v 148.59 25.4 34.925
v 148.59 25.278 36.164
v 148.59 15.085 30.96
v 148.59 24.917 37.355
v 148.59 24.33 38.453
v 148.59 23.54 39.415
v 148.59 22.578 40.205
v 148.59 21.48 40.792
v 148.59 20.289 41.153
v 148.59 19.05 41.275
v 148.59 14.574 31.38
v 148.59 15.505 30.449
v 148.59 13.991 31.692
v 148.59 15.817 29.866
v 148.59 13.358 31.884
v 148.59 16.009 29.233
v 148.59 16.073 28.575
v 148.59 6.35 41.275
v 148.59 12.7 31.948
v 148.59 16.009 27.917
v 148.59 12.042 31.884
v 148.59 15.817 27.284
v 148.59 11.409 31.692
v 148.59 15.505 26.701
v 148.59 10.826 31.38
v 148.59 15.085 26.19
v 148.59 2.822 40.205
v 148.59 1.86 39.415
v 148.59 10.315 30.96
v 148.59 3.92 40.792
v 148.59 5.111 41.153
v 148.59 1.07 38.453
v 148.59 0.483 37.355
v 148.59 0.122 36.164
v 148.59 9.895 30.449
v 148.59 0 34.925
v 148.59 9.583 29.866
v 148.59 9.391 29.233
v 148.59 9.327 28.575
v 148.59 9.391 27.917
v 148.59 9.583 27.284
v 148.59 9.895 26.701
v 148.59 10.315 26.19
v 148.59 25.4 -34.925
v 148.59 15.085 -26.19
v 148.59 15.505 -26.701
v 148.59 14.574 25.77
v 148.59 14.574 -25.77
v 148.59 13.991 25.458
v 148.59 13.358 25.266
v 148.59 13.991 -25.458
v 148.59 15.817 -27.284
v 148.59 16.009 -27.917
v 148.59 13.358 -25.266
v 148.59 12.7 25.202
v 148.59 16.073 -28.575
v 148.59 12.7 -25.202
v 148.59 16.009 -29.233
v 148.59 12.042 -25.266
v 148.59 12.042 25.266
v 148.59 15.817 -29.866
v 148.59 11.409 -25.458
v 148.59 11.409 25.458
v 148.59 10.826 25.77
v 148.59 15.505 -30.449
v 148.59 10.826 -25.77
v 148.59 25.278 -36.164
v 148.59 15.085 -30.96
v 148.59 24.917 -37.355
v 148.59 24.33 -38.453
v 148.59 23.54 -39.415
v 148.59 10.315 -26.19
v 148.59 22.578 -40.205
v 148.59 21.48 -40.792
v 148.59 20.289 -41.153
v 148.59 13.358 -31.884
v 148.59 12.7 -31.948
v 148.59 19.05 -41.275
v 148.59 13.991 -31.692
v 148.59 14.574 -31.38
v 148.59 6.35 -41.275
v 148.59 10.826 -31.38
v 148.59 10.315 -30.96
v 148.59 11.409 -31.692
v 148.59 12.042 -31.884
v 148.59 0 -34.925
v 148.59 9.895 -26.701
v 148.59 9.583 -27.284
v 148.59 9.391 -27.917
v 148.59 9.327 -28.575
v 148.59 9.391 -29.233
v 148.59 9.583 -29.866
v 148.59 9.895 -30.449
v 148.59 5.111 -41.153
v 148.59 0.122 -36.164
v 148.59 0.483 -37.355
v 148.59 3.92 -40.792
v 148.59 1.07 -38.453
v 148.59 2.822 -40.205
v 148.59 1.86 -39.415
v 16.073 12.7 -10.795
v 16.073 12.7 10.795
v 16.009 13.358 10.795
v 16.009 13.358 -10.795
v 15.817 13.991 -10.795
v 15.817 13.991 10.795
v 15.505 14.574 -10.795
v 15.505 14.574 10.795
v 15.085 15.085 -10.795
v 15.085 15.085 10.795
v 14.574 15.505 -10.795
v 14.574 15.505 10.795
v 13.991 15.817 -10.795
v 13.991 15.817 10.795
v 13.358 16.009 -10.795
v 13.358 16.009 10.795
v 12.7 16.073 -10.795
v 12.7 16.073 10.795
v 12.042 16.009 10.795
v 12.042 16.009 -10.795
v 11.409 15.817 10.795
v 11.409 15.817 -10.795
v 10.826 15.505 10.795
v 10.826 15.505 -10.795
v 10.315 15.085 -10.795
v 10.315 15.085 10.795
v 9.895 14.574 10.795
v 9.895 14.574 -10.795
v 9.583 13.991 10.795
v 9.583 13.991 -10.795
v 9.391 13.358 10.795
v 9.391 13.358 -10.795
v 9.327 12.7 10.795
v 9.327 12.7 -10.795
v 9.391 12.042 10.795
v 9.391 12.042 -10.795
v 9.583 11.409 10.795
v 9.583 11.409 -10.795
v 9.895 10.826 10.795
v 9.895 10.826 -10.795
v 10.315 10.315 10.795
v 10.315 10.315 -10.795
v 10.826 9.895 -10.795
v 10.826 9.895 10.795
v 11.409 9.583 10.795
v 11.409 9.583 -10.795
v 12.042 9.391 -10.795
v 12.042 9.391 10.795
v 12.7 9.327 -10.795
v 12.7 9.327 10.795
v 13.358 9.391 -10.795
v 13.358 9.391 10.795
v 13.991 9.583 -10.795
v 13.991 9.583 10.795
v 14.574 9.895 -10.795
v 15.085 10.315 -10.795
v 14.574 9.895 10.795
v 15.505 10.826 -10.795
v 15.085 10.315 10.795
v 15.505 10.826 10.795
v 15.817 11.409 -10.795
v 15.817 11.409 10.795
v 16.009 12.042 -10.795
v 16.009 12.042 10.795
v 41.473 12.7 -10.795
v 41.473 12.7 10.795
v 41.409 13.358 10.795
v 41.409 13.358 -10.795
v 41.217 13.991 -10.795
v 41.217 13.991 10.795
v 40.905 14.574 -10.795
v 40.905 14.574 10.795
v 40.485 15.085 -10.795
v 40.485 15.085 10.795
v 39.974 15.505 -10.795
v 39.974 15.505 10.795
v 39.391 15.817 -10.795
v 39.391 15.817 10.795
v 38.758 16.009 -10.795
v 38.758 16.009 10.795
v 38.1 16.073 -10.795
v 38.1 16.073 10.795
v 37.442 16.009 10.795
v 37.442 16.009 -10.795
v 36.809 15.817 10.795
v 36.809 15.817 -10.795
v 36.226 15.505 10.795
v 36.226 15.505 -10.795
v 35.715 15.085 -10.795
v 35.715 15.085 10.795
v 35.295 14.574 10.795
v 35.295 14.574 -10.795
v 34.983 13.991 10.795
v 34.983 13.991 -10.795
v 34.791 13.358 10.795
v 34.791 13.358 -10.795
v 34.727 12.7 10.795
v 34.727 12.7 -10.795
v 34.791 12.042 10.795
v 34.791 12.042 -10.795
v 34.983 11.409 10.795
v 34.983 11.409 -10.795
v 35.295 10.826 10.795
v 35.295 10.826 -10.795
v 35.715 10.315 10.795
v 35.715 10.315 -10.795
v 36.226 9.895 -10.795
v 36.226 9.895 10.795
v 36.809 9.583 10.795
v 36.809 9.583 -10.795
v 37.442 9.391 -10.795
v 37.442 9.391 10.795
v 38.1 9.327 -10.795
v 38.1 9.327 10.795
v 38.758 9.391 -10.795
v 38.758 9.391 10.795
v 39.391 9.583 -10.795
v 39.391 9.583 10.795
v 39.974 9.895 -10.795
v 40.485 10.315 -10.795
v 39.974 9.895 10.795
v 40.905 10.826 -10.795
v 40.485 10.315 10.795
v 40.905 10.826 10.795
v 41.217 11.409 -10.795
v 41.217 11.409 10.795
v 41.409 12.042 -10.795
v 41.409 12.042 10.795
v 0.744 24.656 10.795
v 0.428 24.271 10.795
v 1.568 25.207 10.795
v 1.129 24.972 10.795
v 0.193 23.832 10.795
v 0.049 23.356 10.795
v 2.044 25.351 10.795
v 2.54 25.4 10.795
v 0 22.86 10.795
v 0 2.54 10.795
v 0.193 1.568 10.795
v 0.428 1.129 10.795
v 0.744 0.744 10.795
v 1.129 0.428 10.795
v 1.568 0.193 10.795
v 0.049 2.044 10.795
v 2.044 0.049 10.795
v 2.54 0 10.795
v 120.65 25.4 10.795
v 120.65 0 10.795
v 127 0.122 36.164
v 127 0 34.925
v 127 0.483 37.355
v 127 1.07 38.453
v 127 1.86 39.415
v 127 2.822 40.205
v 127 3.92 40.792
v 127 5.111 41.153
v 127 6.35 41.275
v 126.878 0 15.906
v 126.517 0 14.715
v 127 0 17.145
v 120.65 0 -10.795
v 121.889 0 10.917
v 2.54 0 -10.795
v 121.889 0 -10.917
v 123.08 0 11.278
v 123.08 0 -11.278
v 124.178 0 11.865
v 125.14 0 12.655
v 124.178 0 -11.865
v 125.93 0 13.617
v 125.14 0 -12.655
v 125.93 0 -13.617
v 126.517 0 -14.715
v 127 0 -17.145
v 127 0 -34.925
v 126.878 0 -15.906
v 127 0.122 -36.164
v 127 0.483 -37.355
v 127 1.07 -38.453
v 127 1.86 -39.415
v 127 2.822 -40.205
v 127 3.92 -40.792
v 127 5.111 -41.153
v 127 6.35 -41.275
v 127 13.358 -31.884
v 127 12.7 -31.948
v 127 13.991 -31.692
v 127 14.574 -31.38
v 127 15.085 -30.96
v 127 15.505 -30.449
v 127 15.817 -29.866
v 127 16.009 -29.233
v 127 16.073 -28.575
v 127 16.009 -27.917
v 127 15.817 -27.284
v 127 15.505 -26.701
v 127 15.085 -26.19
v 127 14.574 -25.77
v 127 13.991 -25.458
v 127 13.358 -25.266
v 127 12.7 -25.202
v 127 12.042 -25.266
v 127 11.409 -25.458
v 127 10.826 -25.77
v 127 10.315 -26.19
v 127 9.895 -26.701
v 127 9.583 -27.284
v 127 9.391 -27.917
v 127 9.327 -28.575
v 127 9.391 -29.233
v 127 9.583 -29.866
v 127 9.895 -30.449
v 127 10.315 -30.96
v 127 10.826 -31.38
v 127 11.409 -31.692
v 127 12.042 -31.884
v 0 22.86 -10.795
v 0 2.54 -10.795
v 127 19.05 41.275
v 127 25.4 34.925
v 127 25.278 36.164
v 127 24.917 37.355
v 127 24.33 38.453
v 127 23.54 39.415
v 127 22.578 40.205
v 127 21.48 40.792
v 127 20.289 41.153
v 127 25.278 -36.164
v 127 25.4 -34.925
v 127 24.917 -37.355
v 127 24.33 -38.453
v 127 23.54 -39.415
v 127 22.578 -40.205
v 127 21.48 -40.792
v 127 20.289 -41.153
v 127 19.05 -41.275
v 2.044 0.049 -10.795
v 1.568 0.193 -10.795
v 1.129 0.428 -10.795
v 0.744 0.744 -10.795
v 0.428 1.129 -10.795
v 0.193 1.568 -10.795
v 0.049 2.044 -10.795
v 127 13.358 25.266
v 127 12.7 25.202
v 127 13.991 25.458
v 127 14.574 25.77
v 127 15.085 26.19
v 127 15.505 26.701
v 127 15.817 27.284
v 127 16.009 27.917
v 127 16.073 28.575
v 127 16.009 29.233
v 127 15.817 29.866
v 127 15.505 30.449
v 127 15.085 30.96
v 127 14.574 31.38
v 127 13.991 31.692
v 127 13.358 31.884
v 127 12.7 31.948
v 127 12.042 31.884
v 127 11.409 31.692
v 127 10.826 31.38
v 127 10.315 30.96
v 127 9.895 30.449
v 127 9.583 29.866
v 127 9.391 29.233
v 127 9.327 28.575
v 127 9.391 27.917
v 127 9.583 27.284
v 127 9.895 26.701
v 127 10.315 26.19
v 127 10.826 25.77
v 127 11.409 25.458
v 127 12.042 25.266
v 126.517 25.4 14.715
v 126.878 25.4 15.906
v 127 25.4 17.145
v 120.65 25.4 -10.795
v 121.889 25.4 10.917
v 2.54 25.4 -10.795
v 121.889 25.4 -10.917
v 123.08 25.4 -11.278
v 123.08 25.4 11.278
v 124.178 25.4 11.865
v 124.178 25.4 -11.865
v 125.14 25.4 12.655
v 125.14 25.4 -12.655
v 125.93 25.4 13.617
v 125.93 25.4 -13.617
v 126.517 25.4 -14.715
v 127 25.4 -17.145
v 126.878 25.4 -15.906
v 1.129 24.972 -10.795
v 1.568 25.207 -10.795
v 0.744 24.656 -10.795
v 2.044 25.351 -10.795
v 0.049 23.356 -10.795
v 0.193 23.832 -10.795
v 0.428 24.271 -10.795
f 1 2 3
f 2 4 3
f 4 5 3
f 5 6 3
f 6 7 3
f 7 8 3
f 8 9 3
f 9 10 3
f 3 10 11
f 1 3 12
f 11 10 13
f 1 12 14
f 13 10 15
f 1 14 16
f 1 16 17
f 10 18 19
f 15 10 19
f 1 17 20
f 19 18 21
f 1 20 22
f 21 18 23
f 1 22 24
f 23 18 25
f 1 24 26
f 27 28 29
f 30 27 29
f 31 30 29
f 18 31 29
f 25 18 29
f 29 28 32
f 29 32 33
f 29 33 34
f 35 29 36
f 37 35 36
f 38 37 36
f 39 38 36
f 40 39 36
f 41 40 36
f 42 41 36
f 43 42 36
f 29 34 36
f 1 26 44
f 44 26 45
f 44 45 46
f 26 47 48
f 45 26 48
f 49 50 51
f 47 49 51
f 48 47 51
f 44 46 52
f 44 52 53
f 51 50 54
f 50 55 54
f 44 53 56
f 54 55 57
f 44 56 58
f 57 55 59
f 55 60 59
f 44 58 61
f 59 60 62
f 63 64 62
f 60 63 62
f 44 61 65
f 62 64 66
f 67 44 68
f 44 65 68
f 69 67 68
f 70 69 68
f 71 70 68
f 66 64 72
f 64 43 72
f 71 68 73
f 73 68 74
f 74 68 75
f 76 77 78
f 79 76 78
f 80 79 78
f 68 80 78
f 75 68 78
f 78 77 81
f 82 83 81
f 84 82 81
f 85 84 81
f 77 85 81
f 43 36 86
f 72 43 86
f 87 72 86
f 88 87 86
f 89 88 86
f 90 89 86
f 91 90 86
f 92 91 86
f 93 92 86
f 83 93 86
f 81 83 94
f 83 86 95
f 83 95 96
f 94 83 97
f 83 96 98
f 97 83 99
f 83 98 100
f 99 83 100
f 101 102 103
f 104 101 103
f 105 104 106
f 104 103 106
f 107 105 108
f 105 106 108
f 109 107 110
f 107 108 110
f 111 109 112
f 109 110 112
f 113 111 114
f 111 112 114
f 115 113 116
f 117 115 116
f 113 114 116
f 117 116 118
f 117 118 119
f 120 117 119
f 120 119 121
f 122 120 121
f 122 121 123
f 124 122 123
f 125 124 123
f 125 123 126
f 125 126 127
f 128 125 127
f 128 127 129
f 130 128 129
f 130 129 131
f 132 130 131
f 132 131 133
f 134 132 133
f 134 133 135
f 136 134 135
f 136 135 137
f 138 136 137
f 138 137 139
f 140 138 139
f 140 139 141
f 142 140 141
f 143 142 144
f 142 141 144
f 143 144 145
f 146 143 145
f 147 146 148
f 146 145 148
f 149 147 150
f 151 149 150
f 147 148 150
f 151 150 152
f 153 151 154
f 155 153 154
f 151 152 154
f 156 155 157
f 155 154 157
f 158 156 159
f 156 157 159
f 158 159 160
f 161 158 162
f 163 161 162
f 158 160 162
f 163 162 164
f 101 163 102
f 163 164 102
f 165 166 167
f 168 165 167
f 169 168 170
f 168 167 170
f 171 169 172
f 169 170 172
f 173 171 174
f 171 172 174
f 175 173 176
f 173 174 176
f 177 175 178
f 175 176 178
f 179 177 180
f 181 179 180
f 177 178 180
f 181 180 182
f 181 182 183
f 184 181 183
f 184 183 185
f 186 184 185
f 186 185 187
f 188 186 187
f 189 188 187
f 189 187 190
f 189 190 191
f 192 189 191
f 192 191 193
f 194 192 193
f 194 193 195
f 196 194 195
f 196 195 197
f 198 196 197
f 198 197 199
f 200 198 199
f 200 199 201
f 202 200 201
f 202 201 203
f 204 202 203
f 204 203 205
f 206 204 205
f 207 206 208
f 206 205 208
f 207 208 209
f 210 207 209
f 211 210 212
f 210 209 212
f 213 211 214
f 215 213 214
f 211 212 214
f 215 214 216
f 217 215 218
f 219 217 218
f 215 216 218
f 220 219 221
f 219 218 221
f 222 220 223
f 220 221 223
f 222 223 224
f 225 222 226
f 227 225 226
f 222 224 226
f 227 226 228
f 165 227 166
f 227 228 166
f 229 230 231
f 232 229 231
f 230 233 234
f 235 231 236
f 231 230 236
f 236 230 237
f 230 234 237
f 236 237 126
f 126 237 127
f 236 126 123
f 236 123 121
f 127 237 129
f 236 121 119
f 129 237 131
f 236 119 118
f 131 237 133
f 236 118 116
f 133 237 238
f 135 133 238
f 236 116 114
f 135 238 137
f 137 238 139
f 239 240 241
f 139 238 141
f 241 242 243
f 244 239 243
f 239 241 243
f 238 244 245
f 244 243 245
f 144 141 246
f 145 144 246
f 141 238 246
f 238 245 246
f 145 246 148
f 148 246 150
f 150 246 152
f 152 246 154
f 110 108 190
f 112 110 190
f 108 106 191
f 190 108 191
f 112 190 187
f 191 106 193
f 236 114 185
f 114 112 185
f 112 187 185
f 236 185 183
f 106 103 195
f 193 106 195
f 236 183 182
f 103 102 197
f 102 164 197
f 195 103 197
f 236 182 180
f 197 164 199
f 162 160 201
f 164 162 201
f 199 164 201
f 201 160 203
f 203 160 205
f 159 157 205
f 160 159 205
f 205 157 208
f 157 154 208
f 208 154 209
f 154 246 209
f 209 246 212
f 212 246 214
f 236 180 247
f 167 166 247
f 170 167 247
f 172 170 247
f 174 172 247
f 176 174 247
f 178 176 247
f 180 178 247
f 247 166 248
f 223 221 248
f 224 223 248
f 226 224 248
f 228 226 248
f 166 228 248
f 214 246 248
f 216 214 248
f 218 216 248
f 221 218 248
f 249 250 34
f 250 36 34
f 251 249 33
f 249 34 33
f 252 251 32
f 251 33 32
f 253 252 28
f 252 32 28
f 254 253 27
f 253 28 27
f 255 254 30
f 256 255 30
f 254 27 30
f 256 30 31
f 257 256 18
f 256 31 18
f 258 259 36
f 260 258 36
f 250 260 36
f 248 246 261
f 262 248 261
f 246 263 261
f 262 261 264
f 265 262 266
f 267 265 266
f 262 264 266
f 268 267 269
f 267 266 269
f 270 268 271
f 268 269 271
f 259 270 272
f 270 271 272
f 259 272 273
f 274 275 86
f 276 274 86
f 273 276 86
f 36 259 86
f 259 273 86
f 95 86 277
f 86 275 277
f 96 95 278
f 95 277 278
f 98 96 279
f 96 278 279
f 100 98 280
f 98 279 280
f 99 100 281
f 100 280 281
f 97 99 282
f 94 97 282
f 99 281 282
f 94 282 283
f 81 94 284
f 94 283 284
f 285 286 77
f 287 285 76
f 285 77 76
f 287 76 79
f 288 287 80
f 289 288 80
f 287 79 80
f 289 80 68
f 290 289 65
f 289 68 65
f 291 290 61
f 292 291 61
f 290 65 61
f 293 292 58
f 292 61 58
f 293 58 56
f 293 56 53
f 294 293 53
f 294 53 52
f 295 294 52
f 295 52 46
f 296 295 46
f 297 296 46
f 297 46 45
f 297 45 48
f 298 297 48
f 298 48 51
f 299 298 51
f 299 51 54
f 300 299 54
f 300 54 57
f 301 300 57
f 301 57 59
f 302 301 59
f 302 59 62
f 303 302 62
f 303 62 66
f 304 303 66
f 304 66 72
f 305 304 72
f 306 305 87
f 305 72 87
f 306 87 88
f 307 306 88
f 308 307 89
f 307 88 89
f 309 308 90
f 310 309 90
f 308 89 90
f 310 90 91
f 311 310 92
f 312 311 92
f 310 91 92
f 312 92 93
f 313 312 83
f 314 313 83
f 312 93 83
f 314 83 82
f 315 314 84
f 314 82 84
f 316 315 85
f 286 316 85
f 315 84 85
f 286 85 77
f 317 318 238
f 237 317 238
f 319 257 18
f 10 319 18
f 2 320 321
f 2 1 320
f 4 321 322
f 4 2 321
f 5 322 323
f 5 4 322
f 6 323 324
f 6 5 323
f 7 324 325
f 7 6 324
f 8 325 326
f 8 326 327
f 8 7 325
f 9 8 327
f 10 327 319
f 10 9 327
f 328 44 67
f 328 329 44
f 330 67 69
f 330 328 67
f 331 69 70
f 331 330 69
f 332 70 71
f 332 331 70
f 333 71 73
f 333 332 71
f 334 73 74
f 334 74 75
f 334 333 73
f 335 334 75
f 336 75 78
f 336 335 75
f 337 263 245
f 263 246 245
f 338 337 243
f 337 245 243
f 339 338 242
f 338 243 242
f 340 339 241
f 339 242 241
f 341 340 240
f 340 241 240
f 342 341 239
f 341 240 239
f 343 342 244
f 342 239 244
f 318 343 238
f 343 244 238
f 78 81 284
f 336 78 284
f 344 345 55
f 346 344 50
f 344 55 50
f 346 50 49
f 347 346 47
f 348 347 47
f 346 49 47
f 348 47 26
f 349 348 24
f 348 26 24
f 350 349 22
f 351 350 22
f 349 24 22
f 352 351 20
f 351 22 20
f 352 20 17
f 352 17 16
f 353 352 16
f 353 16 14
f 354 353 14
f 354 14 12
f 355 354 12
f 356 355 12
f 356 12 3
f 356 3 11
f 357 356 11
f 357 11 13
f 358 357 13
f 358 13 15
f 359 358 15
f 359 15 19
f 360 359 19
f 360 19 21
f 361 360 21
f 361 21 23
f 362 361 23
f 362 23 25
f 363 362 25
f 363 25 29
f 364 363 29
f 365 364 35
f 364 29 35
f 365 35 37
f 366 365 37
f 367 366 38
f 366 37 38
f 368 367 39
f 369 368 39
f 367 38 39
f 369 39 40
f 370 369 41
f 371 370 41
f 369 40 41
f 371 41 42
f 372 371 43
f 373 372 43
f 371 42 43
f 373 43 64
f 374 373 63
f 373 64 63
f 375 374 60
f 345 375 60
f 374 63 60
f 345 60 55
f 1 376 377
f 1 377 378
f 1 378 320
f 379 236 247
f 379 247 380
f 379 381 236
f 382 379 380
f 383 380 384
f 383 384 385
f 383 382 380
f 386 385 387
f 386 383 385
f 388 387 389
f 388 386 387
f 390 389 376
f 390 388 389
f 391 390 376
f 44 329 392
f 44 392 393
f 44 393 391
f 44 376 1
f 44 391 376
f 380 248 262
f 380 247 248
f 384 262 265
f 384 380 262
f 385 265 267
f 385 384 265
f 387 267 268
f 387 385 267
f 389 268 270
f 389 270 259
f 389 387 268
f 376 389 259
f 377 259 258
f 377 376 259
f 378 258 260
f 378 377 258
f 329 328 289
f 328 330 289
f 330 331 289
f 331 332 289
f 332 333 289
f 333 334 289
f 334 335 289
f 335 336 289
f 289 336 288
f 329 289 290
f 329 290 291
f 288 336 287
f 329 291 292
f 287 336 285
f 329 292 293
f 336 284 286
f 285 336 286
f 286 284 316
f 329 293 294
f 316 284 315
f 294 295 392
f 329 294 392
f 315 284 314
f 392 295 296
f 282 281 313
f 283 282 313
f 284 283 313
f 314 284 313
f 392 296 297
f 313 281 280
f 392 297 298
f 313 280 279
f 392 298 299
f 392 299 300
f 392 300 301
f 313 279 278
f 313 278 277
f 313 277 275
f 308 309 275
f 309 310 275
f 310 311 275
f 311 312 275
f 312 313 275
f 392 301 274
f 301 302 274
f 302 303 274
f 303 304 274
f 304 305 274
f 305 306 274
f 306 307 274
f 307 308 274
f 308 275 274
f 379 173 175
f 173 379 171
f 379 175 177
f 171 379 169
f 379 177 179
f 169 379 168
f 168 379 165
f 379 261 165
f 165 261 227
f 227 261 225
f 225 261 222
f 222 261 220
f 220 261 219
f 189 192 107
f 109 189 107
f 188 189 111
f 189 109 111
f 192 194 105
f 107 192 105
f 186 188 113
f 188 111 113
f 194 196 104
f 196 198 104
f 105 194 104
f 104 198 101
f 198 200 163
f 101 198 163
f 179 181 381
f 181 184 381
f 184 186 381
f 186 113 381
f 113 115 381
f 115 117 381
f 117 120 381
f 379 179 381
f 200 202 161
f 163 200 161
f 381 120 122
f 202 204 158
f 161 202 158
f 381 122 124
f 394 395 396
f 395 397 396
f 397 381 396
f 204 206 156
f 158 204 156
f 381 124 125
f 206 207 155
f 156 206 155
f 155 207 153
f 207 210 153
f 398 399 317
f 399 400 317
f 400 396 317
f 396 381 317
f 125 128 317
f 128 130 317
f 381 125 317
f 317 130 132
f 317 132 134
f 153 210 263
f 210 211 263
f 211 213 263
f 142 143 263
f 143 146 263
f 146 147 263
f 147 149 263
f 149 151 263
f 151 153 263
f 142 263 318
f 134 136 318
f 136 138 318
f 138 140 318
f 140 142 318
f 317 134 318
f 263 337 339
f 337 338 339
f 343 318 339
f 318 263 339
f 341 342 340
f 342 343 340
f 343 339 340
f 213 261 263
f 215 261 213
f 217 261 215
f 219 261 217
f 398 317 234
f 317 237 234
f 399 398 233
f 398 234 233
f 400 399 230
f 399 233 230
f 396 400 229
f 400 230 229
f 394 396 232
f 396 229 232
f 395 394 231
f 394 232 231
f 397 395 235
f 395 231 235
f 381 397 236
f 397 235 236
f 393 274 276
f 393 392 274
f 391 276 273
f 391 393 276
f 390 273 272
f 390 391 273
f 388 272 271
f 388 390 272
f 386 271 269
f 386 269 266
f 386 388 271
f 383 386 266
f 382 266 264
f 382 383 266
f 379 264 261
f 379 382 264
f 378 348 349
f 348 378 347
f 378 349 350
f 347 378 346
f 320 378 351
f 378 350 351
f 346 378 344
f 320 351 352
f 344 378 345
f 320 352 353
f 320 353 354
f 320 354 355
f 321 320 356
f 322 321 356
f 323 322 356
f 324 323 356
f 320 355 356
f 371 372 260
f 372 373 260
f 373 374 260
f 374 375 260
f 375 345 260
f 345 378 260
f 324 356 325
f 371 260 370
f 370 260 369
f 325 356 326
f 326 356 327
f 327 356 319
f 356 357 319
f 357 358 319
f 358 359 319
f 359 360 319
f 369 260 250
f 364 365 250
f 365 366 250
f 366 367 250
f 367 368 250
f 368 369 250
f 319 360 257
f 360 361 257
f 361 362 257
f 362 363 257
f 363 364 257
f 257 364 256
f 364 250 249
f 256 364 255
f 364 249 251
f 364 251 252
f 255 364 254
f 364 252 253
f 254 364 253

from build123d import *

# Parameters (mm, degrees)
BOSS_EXTRUDE1_DEPTH = 25.4
FILLET1_R           = 6.35
SKETCH2_R           = 3.3734375
CUT_EXTRUDE1_DEPTH  = 160.484898972
SKETCH3_R           = 3.3734375
CUT_EXTRUDE2_DEPTH  = 157.293869761
FILLET2_R           = 6.35
FILLET3_R           = 2.54


with BuildPart() as part:
    # Sketch1 → Boss-Extrude1 (new body)
    with BuildSketch(Plane(origin=(0, 0, 0), x_dir=(1, 0, 0), z_dir=(0, 1, 0))):
        Polygon((0, 10.795), (0, -10.795), (127, -10.795), (127, -41.275), (148.59, -41.275), (148.59, 41.275), (127, 41.275), (127, 10.795), align=None)
    extrude(amount=BOSS_EXTRUDE1_DEPTH)

    # Fillet1
    fillet1_edges = [part.edges().sort_by_distance(p)[0] for p in [
        (127, 12.7, -10.795),
        (127, 12.7, 10.795),
    ]]
    fillet(fillet1_edges, radius=FILLET1_R)

    # Sketch2 → Cut-Extrude1 (cut, through all)
    with BuildSketch(Plane.XY.offset(10.795)):
        with Locations((12.7, 12.7)):
            Circle(SKETCH2_R)
        with Locations((38.1, 12.7)):
            Circle(SKETCH2_R)
    extrude(amount=-CUT_EXTRUDE1_DEPTH, mode=Mode.SUBTRACT)

    # Sketch3 → Cut-Extrude2 (cut, through all)
    with BuildSketch(Plane(origin=(148.59, 0, 0), x_dir=(0, 0, -1), z_dir=(1, 0, 0))):
        with Locations((-28.575, 12.7)):
            Circle(SKETCH3_R)
        with Locations((28.575, 12.7)):
            Circle(SKETCH3_R)
    extrude(amount=-CUT_EXTRUDE2_DEPTH, mode=Mode.SUBTRACT)

    # Fillet2
    fillet2_edges = [part.edges().sort_by_distance(p)[0] for p in [
        (137.795, 25.4, 41.275),
        (137.795, 25.4, -41.275),
        (137.795, 0, -41.275),
        (137.795, 0, 41.275),
    ]]
    fillet(fillet2_edges, radius=FILLET2_R)

    # Fillet3
    fillet3_edges = [part.edges().sort_by_distance(p)[0] for p in [
        (0, 0, 0),
        (0, 25.4, 0),
    ]]
    fillet(fillet3_edges, radius=FILLET3_R)


solid = part.part
